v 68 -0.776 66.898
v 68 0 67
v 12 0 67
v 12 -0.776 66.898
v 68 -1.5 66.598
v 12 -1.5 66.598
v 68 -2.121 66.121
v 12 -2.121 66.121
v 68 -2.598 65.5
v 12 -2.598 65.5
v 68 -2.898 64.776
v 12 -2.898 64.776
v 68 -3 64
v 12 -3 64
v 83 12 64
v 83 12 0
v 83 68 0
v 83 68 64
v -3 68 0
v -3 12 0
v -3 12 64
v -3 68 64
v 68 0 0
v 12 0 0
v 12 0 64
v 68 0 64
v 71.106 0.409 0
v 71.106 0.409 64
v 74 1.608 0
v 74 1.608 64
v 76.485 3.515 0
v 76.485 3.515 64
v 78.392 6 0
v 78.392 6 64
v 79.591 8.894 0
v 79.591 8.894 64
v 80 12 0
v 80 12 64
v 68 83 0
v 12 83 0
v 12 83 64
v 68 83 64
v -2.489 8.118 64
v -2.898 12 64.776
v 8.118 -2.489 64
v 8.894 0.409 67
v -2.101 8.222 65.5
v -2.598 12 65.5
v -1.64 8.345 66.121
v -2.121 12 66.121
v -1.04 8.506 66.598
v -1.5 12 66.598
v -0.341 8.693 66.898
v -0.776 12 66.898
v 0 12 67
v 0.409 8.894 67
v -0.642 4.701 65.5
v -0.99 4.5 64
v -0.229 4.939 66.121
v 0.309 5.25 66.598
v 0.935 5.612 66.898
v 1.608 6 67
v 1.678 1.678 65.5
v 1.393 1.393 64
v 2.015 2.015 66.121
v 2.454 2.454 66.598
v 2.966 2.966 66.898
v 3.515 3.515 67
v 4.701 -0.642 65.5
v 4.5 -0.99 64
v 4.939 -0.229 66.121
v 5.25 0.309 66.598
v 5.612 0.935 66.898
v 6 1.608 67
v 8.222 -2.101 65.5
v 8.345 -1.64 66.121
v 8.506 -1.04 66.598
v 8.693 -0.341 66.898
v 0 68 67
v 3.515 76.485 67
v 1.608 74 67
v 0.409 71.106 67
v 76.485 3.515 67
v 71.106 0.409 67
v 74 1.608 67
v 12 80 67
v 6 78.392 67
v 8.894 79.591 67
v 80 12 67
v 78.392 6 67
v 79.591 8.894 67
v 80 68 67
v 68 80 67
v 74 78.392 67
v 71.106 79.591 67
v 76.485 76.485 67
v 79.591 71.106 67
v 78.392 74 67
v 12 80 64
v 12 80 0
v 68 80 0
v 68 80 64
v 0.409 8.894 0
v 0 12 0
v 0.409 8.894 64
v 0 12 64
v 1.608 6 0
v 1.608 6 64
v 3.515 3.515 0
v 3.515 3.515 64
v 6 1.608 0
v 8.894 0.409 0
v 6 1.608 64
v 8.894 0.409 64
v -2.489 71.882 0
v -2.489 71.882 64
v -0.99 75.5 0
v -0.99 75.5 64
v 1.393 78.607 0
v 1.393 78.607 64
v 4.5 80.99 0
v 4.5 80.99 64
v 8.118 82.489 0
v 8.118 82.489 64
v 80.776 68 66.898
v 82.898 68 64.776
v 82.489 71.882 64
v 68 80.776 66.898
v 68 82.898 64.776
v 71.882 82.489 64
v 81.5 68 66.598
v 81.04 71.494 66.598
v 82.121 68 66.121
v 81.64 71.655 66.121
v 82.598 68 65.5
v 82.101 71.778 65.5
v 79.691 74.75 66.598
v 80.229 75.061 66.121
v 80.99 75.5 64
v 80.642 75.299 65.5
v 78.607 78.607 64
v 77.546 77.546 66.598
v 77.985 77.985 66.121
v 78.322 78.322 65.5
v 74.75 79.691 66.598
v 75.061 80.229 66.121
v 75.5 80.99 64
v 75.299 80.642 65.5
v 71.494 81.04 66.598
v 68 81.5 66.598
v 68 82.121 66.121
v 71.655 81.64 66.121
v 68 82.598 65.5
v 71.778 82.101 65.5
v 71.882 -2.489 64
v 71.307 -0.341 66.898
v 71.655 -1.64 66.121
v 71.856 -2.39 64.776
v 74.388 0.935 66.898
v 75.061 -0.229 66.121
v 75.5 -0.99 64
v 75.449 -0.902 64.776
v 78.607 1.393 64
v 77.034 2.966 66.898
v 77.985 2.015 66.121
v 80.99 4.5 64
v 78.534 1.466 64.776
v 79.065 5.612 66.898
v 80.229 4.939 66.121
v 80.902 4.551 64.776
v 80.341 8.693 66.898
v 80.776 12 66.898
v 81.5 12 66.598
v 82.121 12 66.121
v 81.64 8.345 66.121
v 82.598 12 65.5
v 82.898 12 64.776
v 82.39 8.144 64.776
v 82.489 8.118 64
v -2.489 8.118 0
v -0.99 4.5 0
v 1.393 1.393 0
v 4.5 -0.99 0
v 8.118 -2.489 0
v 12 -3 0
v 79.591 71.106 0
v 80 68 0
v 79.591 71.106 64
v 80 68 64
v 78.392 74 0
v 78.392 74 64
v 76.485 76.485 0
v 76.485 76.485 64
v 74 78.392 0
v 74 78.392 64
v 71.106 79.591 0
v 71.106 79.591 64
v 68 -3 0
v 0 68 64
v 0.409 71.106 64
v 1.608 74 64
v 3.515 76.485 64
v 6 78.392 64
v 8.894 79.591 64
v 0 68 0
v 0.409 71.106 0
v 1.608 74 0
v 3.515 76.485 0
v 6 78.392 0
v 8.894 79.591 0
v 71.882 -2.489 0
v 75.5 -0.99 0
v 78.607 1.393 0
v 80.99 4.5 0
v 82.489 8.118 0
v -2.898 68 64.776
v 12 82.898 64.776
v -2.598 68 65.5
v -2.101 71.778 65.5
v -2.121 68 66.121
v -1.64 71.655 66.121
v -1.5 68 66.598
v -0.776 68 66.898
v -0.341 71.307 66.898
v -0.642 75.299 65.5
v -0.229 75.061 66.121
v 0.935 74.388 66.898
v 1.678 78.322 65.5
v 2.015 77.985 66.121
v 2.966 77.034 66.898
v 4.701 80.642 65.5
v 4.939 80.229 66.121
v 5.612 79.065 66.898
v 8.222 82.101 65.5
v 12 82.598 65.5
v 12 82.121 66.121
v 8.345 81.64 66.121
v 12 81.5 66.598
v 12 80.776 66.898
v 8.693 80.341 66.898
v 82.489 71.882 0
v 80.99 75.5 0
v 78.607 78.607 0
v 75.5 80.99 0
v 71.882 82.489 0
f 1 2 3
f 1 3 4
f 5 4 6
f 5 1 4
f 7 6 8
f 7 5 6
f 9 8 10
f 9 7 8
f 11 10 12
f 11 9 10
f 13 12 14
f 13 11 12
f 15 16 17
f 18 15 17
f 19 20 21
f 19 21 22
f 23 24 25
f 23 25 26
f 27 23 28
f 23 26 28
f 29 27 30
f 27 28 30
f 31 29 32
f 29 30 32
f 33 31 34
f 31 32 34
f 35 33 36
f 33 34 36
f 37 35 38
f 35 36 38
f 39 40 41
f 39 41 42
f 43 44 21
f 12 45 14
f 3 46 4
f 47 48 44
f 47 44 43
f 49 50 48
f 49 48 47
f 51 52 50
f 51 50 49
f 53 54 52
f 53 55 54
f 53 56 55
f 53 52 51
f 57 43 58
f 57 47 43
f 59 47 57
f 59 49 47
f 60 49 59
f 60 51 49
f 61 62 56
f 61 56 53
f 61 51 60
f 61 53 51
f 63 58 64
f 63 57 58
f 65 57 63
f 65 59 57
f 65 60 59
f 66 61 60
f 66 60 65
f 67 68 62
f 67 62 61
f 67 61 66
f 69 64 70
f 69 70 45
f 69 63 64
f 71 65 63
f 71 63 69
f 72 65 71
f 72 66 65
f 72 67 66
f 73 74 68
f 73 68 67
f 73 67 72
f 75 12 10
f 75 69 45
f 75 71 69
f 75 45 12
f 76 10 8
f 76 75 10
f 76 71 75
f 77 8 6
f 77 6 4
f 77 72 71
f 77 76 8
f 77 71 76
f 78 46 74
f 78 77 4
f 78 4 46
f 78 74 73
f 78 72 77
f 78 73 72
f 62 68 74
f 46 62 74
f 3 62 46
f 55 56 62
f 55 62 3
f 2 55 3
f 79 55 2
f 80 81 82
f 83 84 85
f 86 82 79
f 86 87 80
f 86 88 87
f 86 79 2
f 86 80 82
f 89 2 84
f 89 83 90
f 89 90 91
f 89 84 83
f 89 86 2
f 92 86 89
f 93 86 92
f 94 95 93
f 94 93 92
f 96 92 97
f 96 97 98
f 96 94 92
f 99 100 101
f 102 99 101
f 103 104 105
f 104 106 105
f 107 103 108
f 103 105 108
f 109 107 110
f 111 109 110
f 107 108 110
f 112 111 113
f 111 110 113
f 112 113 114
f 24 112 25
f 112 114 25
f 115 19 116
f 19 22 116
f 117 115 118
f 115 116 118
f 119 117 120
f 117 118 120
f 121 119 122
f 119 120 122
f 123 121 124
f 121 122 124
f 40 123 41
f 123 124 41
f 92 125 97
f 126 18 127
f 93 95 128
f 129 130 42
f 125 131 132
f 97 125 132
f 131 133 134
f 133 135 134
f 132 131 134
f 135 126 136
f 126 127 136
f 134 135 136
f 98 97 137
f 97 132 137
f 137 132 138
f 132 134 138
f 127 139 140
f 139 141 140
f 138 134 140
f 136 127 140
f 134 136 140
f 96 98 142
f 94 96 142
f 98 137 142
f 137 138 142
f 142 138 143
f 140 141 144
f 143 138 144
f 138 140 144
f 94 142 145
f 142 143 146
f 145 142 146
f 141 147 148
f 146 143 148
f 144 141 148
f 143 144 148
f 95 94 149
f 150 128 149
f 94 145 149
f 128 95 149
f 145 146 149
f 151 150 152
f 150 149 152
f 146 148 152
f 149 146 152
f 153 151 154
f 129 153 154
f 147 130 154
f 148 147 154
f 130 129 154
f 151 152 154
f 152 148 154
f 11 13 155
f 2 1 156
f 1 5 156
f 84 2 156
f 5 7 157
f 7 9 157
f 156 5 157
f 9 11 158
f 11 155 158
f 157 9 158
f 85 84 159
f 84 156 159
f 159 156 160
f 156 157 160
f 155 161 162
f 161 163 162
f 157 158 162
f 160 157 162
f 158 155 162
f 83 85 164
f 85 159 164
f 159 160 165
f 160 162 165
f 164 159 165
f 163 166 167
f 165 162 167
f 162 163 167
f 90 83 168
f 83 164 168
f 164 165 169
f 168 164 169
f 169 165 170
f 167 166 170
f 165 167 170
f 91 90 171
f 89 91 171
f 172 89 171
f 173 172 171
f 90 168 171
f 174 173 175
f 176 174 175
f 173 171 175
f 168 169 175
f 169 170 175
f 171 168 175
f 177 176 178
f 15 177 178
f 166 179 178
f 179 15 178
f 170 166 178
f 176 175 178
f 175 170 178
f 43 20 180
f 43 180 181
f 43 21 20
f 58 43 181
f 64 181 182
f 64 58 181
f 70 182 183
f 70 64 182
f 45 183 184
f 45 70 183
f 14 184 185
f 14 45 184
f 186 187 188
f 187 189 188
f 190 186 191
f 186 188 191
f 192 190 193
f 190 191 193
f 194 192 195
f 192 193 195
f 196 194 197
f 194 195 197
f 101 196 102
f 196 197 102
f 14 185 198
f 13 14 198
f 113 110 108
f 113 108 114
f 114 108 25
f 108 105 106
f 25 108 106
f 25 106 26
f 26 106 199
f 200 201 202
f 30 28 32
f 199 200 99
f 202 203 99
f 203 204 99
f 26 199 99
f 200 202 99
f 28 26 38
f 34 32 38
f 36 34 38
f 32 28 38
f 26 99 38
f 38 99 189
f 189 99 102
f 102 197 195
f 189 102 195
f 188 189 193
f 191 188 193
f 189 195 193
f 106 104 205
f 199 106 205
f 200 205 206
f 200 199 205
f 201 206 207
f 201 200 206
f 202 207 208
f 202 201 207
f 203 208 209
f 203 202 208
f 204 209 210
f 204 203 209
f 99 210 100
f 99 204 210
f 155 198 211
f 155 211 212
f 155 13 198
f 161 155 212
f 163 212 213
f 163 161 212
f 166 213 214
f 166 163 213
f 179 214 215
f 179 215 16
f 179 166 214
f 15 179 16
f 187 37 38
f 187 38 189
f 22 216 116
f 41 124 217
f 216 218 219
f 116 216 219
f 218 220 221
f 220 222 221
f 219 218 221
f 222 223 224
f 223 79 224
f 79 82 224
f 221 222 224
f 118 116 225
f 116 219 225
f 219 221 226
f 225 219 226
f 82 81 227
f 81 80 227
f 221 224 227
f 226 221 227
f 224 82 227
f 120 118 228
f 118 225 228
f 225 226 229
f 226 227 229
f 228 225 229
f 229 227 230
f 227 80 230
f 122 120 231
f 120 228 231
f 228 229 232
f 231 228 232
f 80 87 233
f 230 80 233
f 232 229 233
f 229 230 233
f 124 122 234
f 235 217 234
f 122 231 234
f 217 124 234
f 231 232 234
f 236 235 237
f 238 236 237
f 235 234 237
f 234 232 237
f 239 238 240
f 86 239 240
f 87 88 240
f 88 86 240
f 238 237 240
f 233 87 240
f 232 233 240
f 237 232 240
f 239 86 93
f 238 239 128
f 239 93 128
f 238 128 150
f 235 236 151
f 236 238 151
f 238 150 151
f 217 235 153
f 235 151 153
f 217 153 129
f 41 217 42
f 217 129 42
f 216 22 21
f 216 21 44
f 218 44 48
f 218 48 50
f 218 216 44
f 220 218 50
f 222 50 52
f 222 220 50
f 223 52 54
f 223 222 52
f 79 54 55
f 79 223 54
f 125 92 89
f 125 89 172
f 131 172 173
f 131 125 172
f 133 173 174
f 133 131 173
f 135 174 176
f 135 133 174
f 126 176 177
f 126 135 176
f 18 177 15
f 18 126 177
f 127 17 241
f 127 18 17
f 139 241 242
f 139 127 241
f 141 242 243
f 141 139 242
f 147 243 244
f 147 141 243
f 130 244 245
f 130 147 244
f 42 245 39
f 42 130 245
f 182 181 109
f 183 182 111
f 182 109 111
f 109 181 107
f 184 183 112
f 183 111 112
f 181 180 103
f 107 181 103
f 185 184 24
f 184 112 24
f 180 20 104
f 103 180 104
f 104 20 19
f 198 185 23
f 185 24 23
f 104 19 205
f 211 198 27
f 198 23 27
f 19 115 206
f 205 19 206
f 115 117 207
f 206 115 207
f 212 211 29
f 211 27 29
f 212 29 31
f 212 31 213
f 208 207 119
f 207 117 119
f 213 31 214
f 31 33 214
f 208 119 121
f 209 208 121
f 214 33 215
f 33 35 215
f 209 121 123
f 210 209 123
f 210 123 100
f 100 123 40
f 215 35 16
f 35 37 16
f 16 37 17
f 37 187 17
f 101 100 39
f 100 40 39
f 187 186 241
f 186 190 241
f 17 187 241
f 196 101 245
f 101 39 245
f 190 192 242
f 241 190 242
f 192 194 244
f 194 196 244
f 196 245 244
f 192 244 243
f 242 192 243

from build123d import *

# Parameters (mm, degrees)
BOX001_W     = 80
BOX001_H     = 80
BOX001_DEPTH = 64
FILLET_R     = 12
THICKNESS_T  = 3


with BuildPart() as part:
    # Box001 → Box001 (new body)
    with BuildSketch(Plane.XY):
        with Locations((40, 40)):
            Rectangle(BOX001_W, BOX001_H)
    extrude(amount=BOX001_DEPTH)

    # Fillet
    fillet_edges = [part.edges().sort_by_distance(p)[0] for p in [
        (0, 0, 32),
        (0, 80, 32),
        (80, 0, 32),
        (80, 80, 32),
    ]]
    fillet(fillet_edges, radius=FILLET_R)

    # Thickness
    thickness_openings = [part.faces().sort_by_distance(p)[0] for p in [
        (40, 40, 0),
    ]]
    offset(amount=THICKNESS_T, openings=thickness_openings)


solid = part.part
